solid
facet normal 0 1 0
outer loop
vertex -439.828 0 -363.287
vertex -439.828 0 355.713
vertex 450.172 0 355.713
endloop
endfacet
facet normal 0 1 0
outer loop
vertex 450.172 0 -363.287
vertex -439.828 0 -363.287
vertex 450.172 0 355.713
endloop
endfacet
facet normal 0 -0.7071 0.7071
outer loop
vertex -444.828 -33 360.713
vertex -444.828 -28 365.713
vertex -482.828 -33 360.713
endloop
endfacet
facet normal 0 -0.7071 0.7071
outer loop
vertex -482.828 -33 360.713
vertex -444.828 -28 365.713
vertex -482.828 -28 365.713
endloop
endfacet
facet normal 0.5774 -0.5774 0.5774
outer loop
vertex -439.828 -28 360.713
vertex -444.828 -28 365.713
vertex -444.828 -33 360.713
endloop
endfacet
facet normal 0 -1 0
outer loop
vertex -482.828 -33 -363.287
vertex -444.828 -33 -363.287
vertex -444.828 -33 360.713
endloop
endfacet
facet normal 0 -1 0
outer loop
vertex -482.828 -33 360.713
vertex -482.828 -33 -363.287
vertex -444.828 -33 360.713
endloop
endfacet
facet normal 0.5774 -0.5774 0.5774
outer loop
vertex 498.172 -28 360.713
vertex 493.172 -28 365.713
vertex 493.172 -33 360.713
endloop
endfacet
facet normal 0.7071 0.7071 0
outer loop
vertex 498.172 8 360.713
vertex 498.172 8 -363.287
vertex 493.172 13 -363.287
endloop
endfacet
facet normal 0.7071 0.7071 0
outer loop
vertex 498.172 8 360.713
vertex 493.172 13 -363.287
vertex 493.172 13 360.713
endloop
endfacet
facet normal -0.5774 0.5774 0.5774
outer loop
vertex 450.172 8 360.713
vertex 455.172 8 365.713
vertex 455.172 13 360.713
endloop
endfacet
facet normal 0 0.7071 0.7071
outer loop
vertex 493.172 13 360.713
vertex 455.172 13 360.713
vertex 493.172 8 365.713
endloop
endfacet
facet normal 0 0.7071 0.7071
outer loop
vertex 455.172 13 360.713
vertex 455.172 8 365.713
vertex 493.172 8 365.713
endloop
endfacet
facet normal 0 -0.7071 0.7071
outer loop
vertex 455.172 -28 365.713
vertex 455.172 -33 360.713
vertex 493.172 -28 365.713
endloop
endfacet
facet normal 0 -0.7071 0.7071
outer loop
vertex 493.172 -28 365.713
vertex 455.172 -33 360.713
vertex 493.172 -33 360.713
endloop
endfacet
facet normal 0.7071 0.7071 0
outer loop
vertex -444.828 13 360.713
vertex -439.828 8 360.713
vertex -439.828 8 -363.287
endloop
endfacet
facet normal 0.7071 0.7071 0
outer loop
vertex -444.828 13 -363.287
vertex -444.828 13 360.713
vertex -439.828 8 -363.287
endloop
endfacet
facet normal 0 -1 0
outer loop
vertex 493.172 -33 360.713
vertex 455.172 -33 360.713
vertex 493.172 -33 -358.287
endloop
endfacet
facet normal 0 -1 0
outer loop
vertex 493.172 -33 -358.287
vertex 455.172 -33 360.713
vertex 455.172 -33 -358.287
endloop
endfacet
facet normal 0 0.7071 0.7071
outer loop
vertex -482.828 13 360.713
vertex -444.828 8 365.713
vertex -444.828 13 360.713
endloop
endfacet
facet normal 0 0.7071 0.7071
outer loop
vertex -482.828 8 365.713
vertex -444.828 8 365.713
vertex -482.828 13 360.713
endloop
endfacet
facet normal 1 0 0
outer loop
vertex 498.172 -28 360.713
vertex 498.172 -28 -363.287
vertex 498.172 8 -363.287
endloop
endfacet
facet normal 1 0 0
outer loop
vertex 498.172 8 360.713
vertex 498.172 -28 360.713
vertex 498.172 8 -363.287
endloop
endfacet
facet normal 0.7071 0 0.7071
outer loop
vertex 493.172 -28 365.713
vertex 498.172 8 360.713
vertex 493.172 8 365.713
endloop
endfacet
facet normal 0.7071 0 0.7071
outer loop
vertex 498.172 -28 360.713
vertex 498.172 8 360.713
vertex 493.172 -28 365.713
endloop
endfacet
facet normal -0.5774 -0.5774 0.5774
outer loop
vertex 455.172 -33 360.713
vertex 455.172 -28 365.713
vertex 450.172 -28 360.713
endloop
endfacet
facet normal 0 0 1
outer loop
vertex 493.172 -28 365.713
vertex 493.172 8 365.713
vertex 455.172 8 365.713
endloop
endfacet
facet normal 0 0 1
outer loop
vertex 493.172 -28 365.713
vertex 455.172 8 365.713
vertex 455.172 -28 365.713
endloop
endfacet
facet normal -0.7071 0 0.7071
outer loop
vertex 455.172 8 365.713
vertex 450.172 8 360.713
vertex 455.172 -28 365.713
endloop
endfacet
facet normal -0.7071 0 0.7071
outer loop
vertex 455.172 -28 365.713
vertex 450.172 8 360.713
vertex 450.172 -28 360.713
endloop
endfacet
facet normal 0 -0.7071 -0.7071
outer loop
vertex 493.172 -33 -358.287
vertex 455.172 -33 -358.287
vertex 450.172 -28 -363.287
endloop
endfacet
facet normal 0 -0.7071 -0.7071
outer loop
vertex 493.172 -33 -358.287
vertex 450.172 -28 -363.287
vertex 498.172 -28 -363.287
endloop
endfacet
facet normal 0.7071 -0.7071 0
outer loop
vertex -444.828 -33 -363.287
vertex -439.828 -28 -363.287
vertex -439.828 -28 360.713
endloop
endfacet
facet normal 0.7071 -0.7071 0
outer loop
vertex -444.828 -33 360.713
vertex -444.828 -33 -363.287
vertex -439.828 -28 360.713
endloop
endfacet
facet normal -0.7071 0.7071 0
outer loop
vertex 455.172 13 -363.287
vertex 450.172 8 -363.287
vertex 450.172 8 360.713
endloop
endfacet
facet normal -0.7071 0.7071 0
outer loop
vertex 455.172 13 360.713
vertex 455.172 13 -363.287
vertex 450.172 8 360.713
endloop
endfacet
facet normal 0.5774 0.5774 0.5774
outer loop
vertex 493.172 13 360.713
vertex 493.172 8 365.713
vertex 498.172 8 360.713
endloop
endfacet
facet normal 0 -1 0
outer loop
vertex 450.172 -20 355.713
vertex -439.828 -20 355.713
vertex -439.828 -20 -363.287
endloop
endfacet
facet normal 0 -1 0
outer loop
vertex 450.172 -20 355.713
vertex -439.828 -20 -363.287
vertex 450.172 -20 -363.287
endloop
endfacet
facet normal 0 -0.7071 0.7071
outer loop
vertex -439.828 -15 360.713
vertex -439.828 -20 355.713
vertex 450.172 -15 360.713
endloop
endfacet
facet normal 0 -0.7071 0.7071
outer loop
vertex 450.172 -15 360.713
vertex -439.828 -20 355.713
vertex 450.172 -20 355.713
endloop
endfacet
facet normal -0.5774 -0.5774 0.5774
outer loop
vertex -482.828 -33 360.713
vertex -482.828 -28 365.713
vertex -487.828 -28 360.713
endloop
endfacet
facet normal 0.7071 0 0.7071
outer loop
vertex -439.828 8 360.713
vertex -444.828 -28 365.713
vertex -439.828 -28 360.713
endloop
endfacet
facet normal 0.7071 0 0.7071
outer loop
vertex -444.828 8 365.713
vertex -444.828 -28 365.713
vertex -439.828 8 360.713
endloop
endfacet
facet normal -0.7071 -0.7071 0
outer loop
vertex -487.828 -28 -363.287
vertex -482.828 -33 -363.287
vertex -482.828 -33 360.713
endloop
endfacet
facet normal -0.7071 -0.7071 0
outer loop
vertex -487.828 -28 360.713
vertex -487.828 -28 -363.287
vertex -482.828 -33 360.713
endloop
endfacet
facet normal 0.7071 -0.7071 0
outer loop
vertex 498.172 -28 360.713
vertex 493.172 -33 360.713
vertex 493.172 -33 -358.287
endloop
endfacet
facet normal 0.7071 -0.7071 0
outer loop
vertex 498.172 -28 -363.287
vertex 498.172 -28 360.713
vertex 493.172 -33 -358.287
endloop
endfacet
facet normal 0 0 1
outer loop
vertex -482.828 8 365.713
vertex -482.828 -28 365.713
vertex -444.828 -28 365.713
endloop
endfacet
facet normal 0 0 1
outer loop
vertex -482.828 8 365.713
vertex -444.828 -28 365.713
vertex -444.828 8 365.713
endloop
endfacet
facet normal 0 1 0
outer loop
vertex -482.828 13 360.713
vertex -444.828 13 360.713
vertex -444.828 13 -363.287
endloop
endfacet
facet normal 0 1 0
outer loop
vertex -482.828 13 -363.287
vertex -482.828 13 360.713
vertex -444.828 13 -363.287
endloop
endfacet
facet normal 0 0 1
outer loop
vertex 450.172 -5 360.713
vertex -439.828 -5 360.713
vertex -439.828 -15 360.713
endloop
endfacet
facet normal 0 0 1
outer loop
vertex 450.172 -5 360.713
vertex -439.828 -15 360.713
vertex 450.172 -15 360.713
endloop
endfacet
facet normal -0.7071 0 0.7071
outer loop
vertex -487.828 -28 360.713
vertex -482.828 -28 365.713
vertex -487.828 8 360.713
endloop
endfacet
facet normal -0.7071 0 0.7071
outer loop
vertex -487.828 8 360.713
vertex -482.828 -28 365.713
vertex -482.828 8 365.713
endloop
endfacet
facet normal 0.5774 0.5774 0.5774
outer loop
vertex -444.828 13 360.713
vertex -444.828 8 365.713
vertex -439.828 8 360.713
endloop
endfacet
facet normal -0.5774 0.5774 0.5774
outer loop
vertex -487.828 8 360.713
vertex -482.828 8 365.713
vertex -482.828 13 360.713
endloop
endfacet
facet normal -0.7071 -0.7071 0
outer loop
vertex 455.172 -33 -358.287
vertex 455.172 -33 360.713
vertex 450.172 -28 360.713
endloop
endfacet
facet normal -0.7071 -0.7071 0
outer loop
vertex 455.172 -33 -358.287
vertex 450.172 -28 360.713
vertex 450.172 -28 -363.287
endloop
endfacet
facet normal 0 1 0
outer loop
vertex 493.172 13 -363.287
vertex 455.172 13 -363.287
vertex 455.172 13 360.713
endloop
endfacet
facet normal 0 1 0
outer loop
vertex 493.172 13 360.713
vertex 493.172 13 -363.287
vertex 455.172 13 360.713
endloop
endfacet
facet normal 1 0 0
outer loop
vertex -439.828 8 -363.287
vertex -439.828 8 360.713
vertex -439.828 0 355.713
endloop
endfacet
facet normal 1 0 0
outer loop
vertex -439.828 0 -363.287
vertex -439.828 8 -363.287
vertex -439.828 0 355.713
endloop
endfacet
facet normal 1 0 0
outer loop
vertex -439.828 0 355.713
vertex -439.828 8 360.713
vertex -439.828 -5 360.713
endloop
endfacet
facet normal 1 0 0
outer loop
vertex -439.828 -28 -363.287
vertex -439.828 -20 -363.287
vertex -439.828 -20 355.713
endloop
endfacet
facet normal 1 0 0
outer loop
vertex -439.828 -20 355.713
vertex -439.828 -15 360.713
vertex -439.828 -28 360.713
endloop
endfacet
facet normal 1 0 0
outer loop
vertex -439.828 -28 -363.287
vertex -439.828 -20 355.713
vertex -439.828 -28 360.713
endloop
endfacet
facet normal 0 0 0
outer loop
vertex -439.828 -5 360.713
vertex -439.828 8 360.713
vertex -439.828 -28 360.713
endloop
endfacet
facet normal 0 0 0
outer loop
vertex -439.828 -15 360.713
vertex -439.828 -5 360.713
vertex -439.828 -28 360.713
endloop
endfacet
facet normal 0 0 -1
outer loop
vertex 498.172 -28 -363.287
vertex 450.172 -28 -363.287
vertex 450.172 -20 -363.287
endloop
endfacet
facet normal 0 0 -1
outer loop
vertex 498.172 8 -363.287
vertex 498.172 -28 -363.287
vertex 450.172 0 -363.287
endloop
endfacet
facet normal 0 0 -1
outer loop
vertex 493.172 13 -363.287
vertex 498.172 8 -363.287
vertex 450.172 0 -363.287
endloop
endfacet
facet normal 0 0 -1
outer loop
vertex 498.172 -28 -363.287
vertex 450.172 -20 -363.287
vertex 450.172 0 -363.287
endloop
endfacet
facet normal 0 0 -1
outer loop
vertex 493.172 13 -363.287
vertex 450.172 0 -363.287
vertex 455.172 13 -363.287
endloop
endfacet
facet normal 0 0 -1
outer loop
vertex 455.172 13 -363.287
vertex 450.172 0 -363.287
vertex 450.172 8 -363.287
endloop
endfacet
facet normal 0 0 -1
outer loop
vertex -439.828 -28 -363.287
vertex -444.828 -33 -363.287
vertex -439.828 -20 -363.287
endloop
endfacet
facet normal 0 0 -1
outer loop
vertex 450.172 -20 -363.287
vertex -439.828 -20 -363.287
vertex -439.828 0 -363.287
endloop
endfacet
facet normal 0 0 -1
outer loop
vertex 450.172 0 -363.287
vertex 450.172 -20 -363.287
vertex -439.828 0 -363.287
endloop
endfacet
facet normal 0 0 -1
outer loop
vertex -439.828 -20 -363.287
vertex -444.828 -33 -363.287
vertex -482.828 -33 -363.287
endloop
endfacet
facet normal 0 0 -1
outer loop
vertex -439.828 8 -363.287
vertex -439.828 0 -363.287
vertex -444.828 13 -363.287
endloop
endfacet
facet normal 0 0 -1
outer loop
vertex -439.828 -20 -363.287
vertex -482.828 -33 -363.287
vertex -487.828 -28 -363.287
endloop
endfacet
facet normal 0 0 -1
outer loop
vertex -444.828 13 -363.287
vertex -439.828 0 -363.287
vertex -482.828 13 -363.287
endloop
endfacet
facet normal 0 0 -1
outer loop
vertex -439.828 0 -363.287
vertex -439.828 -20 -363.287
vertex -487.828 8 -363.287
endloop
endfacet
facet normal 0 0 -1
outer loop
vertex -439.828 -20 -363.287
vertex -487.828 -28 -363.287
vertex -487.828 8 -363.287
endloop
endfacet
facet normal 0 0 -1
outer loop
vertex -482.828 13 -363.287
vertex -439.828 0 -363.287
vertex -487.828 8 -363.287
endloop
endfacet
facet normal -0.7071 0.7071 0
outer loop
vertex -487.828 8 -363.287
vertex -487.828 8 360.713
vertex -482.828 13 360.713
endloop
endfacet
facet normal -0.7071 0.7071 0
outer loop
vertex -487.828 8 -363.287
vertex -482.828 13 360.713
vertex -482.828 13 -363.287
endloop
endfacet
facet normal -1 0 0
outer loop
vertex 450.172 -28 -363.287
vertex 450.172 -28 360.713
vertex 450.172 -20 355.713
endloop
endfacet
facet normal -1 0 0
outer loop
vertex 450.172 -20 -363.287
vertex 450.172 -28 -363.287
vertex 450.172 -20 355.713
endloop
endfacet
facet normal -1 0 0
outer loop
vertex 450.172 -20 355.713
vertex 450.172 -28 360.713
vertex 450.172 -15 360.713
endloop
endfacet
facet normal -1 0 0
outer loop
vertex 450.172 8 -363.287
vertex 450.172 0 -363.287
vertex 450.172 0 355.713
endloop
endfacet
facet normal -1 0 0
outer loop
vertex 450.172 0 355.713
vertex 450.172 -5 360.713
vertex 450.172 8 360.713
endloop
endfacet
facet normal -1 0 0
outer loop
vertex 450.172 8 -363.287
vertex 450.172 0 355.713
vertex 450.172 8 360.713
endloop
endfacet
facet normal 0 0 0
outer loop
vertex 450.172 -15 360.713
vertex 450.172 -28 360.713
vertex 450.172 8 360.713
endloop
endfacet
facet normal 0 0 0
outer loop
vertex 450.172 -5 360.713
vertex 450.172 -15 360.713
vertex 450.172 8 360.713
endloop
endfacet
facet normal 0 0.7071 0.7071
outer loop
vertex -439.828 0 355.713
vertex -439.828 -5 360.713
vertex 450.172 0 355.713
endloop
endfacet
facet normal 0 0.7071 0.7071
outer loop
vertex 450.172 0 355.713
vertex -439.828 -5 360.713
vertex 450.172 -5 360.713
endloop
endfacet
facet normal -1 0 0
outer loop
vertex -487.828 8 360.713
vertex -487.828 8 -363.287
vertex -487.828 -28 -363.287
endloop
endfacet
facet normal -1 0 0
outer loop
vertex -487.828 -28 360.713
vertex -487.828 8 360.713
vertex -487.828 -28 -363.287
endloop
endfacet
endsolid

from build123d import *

# Parameters (mm, degrees)
F0_W     = 890
F0_H     = 724
F1_DEPTH = 20
F2_W     = 20
F2_H     = 724
F3_DEPTH = 48
F4_W     = 20
F4_H     = 724
F5_DEPTH = 48
F6_SIZE  = 4.9999


# Not quite as in the source:
# - a fillet or chamfer is up to 0.001 mm smaller than in the source, because OpenCascade refuses the exact size


with BuildPart() as f1:
    # F0 (on Front) → F1 (new body)
    with BuildSketch(Plane.XZ):
        with Locations((5.1721642405, -1.2866072357)):
            Rectangle(F0_W, F0_H)
    extrude(amount=F1_DEPTH)

    # F2 (on face) → F3 (join)
    with BuildSketch(Plane(origin=(-439.8278357595, 0, 0), x_dir=(0, -1, 0), z_dir=(-1, 0, 0))):
        Polygon((33, 365.7133927643), (-13, 365.7133927643), (-13, -363.2866072357), (0, -363.2866072357), (0, 360.7133927643), (20, 360.7133927643), (20, -363.2866072357), (33, -363.2866072357), align=None)
        with Locations((10, -1.2866072357)):
            Rectangle(F2_W, F2_H)
    extrude(amount=F3_DEPTH)

    # F4 (on face) → F5 (join)
    with BuildSketch(Plane.YZ.offset(450.1721642405)):
        with Locations((-10, -1.2866072357)):
            Rectangle(F4_W, F4_H)
        Polygon((13, 365.7133927643), (-33, 365.7133927643), (-33, -363.2866072357), (-20, -363.2866072357), (-20, 360.7133927643), (0, 360.7133927643), (0, -363.2866072357), (13, -363.2866072357), align=None)
    extrude(amount=F5_DEPTH)

    # F6 (size 5 in the source; OpenCascade refuses exactly that, so slightly less here)
    f6_edges = [f1.edges().sort_by_distance(p)[0] for p in [
        (-463.827836, -33, 365.713393),
        (-487.827836, -10, 365.713393),
        (-439.827836, -10, 365.713393),
        (-463.827836, 13, 365.713393),
        (5.172164, -20, 360.713393),
        (5.172164, 0, 360.713393),
        (474.172164, 13, 365.713393),
        (450.172164, -10, 365.713393),
        (474.172164, -33, 365.713393),
        (498.172164, -10, 365.713393),
        (-487.827836, 13, 1.213393),
        (-439.827836, 13, 1.213393),
        (-487.827836, -33, 1.213393),
        (-439.827836, -33, 1.213393),
        (450.172164, -33, 1.213393),
        (474.172164, -33, -363.286607),
        (498.172164, -33, 1.213393),
        (450.172164, 13, 1.213393),
        (498.172164, 13, 1.213393),
    ]]
    chamfer(f6_edges, length=F6_SIZE)


solid = f1.part
